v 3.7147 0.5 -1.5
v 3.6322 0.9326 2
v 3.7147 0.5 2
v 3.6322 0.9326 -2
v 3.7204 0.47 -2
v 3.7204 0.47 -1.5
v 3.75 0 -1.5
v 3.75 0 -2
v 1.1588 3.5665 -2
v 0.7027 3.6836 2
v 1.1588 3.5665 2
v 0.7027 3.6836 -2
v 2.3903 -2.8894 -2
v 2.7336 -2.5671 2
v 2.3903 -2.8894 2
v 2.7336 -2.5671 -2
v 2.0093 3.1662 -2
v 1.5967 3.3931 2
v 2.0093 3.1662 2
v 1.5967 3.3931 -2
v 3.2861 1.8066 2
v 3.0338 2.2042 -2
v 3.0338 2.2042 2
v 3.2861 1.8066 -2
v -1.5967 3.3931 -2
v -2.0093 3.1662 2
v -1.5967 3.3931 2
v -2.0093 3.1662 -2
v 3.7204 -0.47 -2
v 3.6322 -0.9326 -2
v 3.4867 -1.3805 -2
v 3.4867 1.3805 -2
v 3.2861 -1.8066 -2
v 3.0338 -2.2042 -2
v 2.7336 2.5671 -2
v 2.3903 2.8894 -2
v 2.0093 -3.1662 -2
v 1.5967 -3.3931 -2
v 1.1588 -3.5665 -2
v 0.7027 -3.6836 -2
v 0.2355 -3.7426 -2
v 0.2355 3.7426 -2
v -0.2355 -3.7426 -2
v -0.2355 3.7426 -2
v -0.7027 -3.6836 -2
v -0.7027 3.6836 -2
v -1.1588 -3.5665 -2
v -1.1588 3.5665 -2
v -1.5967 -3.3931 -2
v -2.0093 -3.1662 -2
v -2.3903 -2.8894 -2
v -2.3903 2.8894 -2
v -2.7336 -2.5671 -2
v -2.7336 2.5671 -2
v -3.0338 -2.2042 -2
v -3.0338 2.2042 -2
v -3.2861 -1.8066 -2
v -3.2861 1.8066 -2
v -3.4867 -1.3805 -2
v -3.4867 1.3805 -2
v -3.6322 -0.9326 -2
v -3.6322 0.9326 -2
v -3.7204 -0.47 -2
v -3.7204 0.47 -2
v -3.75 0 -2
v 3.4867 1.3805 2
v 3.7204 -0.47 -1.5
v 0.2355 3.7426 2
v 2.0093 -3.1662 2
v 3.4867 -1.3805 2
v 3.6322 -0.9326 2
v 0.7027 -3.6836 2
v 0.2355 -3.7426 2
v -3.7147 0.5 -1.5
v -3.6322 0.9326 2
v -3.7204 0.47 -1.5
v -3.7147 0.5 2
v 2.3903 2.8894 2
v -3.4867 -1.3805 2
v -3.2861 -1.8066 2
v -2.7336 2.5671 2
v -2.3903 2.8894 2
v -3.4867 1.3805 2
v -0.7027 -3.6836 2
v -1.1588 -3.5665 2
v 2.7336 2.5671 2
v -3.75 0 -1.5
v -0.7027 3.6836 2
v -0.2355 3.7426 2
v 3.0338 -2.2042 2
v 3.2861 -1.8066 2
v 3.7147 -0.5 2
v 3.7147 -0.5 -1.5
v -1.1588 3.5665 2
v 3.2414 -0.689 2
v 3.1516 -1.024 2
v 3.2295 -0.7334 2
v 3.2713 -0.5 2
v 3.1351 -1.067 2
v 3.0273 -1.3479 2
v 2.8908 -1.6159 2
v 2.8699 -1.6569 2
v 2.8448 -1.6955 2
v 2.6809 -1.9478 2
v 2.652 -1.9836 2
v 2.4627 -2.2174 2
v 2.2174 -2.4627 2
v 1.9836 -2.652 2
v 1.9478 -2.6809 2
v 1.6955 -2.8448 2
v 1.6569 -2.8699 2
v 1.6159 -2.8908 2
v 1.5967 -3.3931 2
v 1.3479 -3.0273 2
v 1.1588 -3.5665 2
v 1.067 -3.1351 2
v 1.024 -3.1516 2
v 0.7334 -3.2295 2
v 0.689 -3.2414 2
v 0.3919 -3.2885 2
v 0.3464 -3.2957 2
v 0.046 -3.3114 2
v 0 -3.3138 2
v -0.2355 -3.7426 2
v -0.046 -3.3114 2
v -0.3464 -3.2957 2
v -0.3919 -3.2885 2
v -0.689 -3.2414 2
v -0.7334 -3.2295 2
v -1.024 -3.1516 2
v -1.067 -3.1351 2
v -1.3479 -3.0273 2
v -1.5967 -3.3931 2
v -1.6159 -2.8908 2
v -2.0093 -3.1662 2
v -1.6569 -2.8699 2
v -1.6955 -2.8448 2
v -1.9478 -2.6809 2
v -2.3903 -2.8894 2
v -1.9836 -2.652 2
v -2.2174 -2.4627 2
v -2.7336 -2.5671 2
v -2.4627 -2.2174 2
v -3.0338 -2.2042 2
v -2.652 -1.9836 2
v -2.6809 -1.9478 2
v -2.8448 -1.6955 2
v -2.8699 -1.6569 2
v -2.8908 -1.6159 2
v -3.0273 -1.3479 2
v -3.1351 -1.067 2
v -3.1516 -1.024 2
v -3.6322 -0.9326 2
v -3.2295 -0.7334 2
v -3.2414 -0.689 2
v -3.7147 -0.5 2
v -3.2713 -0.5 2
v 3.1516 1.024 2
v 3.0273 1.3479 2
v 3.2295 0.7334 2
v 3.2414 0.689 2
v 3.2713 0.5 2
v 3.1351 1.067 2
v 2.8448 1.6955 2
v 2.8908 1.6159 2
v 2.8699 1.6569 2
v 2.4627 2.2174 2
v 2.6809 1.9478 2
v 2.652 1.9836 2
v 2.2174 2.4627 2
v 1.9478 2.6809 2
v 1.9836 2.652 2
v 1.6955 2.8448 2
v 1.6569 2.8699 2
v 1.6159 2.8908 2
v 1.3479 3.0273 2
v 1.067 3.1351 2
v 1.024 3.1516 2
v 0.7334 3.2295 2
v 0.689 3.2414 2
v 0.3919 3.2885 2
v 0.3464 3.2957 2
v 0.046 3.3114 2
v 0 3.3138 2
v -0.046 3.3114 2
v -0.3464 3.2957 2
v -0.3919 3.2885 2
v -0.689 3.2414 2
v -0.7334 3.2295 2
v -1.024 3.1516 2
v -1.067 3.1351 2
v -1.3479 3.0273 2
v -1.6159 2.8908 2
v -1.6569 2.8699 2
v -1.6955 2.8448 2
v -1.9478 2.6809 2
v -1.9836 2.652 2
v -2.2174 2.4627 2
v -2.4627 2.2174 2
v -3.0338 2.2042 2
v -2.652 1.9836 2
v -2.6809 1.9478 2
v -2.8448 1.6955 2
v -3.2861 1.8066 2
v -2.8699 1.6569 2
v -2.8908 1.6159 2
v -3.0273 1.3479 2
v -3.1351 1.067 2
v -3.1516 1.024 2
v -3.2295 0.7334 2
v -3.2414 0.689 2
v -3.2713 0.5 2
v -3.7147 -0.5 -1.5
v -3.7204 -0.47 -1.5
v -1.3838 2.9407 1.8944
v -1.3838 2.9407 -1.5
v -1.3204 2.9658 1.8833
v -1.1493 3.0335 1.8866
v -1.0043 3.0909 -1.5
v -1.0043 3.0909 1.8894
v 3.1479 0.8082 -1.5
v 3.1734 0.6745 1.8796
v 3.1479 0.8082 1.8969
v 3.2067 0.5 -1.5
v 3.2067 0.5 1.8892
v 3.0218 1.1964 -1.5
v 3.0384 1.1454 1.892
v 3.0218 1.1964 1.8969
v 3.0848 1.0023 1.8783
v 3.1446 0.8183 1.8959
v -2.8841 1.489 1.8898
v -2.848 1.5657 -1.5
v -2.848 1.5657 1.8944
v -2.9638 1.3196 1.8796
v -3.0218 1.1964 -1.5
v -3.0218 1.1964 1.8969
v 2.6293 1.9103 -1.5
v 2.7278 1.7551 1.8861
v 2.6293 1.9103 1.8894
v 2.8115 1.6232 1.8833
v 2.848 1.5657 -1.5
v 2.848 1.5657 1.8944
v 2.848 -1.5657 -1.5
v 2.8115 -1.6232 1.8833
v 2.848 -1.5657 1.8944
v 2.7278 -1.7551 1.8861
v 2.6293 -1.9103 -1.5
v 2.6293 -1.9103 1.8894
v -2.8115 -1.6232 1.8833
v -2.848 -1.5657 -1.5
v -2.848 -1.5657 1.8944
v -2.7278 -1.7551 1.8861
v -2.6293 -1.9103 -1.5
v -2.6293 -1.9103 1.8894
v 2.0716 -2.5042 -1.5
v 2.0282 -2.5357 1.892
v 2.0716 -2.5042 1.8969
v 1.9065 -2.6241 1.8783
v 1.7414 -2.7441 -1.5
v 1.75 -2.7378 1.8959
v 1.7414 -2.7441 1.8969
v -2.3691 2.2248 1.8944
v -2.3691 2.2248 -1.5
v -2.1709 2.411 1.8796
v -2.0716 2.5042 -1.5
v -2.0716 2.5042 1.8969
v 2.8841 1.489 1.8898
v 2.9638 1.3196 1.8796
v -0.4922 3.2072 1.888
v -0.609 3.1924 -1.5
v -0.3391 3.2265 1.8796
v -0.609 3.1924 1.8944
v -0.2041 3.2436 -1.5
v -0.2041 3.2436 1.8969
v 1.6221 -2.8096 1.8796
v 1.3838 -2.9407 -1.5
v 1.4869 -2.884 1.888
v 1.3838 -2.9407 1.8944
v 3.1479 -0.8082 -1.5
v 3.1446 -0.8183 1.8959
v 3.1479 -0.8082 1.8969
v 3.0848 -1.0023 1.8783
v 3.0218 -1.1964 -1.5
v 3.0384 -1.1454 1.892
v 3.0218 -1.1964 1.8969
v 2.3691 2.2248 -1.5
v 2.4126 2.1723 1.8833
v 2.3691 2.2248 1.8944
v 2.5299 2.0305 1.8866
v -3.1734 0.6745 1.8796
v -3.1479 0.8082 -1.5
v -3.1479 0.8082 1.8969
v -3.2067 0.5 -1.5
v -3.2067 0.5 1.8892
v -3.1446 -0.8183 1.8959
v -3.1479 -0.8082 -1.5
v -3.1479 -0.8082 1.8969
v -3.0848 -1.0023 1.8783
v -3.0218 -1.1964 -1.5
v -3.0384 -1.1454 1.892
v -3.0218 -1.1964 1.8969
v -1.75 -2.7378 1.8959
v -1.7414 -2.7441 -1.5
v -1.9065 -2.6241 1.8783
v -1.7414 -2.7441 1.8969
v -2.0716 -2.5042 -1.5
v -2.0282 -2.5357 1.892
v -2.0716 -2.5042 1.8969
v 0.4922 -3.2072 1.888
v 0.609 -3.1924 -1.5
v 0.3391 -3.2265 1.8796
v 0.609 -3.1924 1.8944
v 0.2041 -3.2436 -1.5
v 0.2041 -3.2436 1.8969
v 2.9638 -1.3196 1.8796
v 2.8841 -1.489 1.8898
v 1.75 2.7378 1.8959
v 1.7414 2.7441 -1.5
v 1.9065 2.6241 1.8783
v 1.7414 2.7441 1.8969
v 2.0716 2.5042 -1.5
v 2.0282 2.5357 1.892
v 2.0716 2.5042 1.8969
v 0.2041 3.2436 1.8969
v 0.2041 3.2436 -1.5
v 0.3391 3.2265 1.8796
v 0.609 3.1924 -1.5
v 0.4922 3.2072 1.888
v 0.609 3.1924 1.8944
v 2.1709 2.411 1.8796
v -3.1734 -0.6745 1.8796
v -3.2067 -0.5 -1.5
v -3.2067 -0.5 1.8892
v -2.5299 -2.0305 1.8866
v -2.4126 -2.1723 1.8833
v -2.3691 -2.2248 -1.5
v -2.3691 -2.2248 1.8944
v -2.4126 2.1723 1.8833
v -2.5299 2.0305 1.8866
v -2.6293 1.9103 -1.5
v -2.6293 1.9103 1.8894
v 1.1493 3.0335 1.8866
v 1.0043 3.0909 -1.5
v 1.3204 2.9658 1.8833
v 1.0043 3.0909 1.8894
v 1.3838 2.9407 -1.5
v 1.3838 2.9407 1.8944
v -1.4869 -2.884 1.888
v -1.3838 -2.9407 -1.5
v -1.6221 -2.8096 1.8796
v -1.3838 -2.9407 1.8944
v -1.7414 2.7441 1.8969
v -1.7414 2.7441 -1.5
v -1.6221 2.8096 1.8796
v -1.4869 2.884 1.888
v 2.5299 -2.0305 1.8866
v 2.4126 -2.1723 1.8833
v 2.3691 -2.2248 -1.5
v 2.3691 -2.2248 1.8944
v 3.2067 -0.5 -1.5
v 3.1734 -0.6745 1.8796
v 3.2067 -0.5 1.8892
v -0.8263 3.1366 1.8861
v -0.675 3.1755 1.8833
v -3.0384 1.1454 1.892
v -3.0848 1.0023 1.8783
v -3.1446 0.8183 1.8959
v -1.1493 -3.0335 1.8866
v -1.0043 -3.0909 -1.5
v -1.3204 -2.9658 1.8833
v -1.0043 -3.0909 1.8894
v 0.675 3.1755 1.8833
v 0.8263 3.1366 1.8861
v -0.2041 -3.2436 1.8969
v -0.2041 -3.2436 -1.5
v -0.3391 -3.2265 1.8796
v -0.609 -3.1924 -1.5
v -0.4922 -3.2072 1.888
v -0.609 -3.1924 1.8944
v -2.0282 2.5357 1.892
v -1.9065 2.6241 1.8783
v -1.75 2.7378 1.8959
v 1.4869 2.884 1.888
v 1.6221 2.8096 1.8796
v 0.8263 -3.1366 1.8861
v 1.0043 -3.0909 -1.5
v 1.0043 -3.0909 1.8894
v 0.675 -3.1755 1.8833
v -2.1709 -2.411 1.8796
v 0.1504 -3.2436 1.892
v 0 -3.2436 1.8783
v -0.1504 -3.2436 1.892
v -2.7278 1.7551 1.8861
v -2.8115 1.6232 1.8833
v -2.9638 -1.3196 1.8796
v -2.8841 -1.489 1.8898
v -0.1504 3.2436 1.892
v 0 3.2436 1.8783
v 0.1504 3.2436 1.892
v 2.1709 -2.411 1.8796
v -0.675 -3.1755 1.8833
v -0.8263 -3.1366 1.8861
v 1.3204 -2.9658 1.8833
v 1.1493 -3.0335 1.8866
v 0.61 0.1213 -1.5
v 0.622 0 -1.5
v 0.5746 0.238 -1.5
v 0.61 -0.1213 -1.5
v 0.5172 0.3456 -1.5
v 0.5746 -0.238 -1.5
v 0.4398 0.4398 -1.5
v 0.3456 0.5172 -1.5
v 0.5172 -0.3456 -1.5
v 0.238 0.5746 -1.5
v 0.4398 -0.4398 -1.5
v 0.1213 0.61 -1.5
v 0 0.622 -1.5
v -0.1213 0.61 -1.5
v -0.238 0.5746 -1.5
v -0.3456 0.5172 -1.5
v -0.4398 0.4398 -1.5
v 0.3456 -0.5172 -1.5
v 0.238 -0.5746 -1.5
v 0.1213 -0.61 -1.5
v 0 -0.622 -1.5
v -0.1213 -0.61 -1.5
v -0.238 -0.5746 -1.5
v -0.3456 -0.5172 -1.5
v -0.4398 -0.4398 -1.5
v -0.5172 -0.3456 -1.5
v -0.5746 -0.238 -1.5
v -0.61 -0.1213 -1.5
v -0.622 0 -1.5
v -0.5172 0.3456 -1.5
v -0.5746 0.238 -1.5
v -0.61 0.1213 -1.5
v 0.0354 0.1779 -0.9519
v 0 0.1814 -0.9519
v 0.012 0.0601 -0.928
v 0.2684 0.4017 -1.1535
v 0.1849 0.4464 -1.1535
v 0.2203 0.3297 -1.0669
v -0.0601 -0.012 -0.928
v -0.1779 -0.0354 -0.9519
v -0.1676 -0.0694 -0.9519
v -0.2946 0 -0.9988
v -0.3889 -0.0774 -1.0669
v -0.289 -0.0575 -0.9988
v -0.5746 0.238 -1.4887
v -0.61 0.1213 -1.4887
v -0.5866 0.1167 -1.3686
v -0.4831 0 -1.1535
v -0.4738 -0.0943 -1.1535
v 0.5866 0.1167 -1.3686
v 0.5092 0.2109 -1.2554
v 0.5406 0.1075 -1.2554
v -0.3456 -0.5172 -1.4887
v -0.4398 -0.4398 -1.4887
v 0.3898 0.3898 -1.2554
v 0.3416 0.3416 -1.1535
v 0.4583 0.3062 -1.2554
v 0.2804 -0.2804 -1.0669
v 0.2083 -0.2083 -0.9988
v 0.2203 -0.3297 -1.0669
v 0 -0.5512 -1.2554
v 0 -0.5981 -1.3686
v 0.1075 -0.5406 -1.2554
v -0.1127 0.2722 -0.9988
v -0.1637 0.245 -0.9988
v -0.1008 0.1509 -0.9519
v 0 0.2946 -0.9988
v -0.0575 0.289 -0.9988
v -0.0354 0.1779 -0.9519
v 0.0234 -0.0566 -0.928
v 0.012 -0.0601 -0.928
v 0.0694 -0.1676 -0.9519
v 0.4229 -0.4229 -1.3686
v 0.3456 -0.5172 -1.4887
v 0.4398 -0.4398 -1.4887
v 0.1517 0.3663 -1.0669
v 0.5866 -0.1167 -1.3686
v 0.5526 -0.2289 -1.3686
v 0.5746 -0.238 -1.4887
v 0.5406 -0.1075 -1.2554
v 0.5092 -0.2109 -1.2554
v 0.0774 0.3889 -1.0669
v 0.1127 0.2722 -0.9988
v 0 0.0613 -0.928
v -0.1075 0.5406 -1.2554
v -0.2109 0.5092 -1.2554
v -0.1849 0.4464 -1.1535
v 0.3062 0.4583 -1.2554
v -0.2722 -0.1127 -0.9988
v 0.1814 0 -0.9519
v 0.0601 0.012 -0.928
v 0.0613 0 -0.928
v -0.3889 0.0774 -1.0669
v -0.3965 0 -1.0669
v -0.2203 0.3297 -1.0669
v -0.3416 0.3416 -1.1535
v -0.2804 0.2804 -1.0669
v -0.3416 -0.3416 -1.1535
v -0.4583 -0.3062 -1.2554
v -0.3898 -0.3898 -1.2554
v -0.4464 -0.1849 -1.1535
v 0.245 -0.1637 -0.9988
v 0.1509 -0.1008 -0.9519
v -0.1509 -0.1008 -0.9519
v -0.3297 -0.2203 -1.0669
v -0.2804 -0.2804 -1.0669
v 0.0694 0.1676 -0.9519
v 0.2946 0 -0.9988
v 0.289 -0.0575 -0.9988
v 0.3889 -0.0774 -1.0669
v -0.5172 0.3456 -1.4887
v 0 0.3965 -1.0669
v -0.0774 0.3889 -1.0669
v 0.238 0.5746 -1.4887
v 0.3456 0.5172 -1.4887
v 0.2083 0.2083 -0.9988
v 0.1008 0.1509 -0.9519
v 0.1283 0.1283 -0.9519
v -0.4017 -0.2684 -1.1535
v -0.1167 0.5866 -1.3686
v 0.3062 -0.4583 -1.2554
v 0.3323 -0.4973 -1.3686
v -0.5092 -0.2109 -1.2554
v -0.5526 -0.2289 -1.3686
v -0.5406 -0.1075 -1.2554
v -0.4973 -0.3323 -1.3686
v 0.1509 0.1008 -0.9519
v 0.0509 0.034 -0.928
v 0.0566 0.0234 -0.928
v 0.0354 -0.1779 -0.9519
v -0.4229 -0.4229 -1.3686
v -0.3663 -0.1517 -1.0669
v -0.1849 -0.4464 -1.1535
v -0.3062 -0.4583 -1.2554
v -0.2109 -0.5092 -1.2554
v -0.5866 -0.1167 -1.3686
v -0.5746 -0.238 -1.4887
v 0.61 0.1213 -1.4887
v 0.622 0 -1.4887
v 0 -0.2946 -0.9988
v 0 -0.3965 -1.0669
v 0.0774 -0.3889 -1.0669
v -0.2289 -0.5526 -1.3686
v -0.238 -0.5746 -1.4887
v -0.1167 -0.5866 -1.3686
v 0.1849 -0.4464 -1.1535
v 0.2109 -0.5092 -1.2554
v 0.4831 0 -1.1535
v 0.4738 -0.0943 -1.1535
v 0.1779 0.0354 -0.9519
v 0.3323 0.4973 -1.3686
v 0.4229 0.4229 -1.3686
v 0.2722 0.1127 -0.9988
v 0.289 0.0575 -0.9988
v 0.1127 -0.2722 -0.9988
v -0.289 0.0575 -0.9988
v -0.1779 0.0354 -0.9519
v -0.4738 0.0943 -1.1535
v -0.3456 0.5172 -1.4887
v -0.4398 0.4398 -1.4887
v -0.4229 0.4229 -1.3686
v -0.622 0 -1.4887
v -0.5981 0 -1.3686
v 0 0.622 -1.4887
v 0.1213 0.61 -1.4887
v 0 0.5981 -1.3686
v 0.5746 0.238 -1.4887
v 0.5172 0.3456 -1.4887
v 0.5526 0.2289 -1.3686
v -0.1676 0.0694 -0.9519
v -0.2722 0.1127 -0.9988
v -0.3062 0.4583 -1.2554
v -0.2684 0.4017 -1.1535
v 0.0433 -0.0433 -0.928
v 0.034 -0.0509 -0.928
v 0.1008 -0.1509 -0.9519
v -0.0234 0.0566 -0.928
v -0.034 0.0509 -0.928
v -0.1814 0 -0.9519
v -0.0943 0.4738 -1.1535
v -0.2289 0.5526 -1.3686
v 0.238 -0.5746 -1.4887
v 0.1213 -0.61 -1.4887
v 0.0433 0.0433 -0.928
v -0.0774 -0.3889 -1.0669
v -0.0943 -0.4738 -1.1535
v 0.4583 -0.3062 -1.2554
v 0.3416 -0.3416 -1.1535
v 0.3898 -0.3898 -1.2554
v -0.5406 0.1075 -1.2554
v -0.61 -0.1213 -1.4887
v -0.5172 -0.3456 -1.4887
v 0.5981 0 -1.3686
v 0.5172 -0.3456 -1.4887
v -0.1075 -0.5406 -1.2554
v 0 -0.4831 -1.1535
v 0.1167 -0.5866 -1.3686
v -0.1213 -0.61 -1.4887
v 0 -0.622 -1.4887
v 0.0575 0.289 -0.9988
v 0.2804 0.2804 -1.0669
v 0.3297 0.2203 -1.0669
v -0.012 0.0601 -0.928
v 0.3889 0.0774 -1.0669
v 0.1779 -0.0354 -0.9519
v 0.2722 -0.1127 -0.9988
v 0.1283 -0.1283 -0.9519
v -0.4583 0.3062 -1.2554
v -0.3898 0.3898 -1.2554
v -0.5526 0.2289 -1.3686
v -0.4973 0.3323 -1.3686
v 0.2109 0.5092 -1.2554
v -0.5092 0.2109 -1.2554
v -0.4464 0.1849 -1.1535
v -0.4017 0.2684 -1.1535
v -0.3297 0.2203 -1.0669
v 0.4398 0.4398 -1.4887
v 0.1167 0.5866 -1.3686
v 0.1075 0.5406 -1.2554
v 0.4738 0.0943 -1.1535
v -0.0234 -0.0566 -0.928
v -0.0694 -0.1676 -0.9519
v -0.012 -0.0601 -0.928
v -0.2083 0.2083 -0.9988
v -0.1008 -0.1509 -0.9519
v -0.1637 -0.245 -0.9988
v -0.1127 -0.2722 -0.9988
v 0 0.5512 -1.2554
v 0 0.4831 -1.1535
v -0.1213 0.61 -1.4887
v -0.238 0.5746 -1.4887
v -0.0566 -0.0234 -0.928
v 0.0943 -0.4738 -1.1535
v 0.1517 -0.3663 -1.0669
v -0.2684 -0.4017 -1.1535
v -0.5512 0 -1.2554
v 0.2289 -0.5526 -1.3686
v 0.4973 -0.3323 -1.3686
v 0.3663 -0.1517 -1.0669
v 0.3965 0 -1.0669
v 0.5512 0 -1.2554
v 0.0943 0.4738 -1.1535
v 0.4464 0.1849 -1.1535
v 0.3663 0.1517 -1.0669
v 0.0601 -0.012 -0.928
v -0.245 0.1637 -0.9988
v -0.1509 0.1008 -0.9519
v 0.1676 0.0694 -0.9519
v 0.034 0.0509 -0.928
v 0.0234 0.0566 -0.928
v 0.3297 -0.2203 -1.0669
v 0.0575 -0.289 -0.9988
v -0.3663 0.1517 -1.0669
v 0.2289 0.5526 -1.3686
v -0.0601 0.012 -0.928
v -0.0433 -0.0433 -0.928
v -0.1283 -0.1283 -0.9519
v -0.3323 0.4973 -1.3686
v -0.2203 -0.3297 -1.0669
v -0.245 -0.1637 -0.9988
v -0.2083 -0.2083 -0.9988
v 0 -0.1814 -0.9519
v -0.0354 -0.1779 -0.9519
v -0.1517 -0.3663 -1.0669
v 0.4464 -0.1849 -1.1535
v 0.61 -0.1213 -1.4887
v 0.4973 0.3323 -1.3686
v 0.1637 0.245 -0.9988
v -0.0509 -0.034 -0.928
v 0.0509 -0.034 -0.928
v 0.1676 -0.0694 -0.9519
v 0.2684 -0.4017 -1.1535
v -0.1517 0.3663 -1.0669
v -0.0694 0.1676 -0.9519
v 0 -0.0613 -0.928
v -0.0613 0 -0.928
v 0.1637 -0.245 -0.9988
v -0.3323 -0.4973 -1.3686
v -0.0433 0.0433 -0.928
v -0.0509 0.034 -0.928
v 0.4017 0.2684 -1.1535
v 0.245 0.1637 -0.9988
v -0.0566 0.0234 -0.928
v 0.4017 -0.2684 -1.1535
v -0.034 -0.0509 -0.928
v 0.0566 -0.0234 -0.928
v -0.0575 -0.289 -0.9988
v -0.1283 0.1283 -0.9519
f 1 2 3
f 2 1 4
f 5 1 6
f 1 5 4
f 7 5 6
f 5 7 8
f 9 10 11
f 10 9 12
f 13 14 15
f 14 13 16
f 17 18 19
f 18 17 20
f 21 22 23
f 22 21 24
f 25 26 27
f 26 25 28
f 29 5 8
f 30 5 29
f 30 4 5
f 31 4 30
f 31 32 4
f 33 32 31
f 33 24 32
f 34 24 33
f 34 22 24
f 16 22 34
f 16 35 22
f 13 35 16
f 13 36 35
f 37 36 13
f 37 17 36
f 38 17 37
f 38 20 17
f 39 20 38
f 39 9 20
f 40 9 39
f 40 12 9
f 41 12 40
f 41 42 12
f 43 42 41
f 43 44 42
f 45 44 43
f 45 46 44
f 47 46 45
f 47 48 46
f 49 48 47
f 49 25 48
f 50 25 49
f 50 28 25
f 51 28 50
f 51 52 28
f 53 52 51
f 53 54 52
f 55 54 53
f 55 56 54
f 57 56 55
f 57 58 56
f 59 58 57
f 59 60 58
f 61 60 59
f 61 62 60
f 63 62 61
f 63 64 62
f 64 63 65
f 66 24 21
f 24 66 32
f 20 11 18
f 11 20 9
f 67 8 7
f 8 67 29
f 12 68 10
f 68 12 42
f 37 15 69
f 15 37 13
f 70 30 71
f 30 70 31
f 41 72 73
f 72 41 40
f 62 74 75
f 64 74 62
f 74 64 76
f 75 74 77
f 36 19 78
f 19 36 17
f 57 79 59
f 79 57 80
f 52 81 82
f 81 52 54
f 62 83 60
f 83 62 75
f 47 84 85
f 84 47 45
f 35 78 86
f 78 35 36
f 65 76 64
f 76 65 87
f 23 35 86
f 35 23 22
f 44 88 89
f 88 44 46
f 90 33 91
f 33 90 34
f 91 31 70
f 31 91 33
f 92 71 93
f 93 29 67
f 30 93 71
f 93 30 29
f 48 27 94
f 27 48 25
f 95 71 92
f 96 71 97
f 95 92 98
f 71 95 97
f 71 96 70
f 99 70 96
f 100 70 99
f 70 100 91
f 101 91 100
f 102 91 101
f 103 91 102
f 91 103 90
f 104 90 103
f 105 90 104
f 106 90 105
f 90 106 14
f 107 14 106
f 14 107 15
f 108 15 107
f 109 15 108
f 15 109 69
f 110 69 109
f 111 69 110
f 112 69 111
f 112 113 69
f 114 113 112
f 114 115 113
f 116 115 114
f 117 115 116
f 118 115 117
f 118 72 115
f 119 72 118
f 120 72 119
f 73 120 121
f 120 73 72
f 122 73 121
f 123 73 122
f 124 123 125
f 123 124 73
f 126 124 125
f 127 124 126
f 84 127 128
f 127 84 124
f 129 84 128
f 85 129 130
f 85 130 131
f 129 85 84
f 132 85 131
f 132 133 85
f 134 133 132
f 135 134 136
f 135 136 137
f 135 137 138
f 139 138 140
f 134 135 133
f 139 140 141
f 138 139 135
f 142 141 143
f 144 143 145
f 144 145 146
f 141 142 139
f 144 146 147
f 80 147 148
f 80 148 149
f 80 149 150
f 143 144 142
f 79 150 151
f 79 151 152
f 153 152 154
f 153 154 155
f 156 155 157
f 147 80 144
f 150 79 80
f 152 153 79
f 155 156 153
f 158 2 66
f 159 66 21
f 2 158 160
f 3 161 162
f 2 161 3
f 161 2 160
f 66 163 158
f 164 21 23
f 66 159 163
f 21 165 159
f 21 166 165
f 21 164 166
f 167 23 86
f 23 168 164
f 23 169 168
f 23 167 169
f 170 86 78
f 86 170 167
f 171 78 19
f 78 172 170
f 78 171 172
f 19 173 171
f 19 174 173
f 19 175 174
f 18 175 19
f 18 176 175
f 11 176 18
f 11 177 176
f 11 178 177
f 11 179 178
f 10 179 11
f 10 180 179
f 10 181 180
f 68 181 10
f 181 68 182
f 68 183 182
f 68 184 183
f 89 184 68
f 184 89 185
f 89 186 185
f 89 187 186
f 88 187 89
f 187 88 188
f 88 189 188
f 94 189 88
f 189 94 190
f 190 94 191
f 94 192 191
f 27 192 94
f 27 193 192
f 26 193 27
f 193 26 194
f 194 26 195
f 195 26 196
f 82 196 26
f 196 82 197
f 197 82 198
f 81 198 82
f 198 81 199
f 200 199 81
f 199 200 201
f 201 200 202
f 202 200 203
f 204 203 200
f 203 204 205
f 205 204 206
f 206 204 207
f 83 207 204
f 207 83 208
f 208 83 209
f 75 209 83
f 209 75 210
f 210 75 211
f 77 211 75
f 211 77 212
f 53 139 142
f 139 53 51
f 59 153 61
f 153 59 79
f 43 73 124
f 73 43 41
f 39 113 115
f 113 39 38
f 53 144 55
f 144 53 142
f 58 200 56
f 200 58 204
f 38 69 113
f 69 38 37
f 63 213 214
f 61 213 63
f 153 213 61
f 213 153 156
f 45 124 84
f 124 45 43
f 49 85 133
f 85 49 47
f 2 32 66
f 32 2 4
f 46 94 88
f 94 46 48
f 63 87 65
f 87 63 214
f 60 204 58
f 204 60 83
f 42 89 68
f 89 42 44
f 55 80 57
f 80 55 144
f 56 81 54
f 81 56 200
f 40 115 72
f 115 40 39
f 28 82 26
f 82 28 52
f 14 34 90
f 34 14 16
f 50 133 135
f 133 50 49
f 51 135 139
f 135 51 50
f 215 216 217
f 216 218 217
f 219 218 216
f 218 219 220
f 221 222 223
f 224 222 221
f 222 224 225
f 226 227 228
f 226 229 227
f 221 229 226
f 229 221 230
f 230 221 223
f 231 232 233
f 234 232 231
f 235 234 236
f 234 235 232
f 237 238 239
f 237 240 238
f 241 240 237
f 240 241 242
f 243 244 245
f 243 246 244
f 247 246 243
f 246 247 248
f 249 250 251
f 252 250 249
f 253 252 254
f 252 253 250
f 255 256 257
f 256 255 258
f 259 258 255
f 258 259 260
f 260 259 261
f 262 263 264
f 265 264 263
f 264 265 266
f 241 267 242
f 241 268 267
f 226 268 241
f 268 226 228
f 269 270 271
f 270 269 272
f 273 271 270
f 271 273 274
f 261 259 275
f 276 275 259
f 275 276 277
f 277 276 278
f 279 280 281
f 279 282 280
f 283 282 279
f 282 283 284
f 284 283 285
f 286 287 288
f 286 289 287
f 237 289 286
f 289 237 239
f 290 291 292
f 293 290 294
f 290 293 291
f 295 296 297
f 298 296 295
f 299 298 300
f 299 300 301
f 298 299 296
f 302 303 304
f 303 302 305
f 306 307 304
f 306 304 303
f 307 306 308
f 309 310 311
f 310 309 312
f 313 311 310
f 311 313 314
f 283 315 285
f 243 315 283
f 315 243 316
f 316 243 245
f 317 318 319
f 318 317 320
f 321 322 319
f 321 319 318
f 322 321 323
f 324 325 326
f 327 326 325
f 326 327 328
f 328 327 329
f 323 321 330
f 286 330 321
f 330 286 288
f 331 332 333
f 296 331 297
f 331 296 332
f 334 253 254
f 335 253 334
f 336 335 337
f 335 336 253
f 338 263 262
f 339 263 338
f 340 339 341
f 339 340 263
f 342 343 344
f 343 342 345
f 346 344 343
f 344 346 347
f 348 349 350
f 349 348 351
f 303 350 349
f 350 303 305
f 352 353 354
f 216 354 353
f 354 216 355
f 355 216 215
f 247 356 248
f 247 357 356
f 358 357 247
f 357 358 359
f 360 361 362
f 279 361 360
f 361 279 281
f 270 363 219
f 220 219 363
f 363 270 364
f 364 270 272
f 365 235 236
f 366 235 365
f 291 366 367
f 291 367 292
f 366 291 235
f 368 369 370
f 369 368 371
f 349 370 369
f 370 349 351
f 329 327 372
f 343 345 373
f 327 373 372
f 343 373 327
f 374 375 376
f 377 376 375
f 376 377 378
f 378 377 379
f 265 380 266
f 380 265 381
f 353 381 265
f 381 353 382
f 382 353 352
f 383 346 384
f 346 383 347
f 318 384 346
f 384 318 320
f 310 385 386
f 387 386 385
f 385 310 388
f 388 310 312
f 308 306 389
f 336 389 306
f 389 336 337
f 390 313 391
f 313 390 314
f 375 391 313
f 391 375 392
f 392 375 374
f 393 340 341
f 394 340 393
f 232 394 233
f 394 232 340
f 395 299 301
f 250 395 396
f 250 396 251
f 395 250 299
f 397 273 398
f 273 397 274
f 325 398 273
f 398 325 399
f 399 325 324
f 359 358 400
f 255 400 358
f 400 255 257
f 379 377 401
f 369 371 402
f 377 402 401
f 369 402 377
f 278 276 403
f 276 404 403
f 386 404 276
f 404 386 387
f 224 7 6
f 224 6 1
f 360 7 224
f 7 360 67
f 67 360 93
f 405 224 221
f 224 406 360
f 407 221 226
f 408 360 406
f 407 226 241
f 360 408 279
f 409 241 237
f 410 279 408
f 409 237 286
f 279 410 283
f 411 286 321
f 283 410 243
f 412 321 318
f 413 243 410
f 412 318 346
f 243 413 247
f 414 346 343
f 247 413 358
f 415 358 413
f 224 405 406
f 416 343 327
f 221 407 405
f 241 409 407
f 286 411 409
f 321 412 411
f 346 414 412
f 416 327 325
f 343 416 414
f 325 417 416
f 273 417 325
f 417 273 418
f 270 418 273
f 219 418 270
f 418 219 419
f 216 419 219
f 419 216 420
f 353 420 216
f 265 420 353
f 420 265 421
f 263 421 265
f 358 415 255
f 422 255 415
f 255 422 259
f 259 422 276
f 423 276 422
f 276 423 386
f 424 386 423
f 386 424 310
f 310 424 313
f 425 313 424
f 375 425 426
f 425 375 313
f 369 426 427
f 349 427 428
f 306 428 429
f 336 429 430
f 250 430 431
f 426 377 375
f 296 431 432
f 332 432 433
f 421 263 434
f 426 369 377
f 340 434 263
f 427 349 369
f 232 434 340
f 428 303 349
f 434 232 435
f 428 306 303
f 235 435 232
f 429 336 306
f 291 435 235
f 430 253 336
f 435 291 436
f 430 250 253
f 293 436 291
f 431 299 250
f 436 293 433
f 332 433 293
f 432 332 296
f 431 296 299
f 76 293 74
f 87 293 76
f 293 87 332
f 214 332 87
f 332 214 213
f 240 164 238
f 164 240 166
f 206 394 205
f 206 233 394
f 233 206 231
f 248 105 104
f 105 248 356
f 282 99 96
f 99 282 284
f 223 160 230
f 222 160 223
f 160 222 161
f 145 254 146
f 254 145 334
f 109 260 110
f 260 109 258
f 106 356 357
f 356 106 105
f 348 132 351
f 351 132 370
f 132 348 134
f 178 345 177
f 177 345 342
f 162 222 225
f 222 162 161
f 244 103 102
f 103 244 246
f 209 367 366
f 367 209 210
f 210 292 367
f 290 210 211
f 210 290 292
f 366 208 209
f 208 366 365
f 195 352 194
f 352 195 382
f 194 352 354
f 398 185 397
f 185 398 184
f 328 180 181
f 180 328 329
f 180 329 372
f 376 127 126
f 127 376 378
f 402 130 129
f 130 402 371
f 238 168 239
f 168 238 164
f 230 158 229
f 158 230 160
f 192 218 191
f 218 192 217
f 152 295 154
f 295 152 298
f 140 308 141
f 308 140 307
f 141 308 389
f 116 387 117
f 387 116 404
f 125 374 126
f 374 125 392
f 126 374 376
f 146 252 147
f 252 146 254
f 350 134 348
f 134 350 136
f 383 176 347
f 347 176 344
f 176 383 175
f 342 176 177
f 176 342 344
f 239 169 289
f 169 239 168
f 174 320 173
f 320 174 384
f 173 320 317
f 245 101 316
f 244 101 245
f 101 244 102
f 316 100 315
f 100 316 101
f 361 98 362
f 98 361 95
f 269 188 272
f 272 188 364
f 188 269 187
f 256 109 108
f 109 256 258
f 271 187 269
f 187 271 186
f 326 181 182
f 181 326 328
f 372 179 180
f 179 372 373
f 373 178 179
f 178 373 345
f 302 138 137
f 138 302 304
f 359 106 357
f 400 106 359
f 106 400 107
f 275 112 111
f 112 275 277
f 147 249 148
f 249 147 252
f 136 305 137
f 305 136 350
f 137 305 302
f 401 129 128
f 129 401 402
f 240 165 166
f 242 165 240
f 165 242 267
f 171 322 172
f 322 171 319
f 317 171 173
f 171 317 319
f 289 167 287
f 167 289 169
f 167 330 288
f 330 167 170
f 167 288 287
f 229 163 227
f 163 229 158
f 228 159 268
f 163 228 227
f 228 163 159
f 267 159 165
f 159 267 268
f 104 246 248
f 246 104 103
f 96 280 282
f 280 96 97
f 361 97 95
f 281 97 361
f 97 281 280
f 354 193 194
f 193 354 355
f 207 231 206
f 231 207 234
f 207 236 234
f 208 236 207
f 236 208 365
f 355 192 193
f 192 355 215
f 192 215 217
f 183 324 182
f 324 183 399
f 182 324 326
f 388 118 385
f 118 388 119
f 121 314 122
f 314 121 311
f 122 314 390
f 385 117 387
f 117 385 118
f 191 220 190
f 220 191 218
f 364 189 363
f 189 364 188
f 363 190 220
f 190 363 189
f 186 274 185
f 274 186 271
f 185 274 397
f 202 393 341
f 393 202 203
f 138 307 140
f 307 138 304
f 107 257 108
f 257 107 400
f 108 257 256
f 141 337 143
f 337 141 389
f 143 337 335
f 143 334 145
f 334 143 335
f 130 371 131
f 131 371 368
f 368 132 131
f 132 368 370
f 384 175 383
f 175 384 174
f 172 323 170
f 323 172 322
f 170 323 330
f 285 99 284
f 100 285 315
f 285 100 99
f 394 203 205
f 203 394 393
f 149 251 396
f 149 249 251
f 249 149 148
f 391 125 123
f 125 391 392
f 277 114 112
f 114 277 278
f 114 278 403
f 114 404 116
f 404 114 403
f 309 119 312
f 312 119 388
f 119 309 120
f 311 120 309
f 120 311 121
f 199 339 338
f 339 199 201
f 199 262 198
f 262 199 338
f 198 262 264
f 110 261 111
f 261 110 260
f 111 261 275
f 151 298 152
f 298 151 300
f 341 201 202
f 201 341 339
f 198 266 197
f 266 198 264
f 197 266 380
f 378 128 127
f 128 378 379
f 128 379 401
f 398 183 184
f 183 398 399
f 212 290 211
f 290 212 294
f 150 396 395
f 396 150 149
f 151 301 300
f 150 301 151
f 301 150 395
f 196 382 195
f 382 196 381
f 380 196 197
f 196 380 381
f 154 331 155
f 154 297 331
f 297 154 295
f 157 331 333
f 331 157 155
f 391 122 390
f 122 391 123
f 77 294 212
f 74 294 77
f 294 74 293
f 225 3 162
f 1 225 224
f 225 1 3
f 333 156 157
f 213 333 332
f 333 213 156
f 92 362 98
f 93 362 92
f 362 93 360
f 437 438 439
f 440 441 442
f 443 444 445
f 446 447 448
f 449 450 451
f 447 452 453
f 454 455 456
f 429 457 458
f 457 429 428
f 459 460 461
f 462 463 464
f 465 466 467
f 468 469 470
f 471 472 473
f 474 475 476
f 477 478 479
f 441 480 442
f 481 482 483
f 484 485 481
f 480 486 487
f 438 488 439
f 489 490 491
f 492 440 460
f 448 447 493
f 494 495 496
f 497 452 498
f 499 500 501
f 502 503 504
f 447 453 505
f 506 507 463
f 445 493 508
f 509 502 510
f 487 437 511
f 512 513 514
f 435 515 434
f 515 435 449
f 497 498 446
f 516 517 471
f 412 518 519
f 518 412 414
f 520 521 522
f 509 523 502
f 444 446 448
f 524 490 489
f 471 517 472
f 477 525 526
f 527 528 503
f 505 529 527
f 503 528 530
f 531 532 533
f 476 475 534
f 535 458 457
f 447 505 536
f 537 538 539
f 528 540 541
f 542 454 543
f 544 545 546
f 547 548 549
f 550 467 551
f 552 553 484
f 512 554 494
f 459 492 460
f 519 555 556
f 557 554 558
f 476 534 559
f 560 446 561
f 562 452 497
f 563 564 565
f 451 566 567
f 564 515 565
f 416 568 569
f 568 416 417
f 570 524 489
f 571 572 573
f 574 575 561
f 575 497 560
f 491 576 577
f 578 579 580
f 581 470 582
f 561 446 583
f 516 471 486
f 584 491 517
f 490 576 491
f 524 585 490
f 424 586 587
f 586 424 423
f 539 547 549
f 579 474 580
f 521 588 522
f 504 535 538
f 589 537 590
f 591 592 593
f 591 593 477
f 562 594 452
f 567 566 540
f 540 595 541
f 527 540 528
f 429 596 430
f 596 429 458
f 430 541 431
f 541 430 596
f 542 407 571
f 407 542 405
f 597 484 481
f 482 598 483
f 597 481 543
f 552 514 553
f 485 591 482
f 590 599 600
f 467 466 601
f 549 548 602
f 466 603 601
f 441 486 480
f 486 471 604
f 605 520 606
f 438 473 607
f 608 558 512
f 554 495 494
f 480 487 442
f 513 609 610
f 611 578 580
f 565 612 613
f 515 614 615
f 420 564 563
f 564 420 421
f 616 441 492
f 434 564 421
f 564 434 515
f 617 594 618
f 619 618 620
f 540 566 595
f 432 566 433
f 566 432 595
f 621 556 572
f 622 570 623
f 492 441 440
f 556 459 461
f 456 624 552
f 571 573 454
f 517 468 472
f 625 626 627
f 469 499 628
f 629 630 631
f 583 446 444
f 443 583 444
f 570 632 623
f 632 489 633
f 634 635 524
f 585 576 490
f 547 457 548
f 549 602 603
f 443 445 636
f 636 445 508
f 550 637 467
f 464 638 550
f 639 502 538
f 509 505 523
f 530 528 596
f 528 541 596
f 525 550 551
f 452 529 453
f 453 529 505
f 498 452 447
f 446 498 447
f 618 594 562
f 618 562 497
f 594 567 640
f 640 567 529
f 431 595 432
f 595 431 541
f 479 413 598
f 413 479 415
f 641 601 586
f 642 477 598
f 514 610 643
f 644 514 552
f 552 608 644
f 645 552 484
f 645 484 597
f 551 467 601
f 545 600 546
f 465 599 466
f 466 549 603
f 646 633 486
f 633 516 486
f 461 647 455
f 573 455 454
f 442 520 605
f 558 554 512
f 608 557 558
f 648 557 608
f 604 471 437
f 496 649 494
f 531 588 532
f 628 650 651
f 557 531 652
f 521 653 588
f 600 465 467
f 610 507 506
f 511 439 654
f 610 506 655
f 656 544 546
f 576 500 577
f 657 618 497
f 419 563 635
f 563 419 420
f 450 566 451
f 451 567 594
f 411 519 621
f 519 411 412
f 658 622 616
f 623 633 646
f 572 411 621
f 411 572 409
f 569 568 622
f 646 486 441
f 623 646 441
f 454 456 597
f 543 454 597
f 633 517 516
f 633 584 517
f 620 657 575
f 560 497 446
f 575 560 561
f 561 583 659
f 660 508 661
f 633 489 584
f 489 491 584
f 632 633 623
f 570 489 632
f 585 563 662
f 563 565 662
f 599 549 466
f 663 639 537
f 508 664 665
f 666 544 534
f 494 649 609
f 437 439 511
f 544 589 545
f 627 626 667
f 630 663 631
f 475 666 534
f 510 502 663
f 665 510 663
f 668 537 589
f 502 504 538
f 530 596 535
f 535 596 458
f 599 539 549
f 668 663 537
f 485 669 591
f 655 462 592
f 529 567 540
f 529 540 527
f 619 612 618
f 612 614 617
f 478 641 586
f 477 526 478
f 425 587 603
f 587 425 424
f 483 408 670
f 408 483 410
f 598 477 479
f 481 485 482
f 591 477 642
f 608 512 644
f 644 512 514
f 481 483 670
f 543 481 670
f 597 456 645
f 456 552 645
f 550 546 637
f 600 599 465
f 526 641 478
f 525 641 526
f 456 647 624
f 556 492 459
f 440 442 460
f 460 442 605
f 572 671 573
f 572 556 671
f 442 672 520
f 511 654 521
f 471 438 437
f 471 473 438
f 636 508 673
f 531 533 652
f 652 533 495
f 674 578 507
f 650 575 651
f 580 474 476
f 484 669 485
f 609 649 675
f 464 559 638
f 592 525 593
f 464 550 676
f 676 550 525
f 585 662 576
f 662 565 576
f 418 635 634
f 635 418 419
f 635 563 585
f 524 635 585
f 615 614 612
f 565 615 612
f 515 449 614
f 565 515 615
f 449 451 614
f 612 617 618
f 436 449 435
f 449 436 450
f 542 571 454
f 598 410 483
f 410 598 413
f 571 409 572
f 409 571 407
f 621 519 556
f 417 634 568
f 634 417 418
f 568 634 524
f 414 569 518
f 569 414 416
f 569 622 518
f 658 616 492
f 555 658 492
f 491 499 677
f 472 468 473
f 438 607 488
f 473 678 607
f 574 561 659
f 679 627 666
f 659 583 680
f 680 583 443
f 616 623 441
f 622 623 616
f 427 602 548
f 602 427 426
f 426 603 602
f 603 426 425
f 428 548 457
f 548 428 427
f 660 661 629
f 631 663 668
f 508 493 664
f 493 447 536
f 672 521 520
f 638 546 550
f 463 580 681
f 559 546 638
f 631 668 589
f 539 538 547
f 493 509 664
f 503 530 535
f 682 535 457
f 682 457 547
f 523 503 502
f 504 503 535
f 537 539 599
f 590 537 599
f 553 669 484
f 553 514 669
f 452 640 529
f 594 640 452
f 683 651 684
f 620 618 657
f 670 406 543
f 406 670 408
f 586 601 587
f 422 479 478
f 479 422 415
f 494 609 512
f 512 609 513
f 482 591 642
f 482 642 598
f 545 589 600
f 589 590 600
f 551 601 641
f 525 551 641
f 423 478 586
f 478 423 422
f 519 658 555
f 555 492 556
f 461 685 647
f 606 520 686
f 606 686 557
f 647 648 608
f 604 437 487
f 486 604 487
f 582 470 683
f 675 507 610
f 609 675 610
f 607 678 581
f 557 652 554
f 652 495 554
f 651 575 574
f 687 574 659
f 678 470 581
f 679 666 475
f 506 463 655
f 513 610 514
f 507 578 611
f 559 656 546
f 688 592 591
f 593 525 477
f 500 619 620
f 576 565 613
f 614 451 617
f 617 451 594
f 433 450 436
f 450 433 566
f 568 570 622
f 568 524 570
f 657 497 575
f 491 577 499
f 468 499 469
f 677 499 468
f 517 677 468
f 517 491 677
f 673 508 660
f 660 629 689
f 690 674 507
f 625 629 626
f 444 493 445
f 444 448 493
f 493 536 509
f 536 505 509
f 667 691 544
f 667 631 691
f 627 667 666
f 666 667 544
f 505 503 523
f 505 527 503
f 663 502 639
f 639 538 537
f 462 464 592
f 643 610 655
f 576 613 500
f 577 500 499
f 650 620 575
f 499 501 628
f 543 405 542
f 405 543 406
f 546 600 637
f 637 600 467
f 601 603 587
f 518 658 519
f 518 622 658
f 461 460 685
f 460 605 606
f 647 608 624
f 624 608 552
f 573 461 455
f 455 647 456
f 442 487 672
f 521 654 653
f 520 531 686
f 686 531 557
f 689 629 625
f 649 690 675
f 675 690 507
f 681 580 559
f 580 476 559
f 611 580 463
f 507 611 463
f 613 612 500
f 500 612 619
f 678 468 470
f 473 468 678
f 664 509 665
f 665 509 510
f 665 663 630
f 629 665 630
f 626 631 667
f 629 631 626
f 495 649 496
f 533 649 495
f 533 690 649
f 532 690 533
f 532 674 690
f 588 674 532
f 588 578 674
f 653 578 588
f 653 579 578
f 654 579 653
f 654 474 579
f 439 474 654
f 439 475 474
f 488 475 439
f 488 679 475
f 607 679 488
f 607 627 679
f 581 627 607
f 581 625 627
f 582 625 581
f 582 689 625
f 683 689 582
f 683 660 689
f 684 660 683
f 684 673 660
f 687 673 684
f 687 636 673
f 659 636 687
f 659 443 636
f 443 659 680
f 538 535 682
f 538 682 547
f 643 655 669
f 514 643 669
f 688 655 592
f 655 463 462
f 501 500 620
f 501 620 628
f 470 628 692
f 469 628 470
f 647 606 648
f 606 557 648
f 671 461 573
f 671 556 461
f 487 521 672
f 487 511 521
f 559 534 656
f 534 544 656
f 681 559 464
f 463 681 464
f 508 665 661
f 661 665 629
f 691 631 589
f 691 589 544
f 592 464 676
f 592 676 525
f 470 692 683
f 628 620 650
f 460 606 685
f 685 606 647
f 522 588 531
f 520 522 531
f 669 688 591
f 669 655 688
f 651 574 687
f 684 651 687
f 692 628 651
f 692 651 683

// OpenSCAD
// brushed motor cap

motor_d = 6.5; // Leave some space for printer variance, e.g. 0.25-0.5mm
cap_h = 4;
wall_thickness = 0.5;

union() {
    difference() {
        cylinder(d=motor_d+(2*wall_thickness), h=cap_h, center=true, $fn=50);
        translate([0,0,wall_thickness/2])
            cylinder(d=motor_d, h=cap_h-wall_thickness, center=true, $fn=50);
        translate([0,0,wall_thickness+motor_d/2]) sphere(d=motor_d+2*wall_thickness, $fn=60);
        translate([0,0,wall_thickness]) cube([motor_d*2,1,cap_h], center=true);
    }
    
    translate([0,0,-1.55]) 
        difference() {
            sphere(d=1.25, h=1, center=true, $fn=32);
            translate([0,0,-0.5]) cylinder(d=1.25, h=1, center=true, $fn=32);
        }
        
}
